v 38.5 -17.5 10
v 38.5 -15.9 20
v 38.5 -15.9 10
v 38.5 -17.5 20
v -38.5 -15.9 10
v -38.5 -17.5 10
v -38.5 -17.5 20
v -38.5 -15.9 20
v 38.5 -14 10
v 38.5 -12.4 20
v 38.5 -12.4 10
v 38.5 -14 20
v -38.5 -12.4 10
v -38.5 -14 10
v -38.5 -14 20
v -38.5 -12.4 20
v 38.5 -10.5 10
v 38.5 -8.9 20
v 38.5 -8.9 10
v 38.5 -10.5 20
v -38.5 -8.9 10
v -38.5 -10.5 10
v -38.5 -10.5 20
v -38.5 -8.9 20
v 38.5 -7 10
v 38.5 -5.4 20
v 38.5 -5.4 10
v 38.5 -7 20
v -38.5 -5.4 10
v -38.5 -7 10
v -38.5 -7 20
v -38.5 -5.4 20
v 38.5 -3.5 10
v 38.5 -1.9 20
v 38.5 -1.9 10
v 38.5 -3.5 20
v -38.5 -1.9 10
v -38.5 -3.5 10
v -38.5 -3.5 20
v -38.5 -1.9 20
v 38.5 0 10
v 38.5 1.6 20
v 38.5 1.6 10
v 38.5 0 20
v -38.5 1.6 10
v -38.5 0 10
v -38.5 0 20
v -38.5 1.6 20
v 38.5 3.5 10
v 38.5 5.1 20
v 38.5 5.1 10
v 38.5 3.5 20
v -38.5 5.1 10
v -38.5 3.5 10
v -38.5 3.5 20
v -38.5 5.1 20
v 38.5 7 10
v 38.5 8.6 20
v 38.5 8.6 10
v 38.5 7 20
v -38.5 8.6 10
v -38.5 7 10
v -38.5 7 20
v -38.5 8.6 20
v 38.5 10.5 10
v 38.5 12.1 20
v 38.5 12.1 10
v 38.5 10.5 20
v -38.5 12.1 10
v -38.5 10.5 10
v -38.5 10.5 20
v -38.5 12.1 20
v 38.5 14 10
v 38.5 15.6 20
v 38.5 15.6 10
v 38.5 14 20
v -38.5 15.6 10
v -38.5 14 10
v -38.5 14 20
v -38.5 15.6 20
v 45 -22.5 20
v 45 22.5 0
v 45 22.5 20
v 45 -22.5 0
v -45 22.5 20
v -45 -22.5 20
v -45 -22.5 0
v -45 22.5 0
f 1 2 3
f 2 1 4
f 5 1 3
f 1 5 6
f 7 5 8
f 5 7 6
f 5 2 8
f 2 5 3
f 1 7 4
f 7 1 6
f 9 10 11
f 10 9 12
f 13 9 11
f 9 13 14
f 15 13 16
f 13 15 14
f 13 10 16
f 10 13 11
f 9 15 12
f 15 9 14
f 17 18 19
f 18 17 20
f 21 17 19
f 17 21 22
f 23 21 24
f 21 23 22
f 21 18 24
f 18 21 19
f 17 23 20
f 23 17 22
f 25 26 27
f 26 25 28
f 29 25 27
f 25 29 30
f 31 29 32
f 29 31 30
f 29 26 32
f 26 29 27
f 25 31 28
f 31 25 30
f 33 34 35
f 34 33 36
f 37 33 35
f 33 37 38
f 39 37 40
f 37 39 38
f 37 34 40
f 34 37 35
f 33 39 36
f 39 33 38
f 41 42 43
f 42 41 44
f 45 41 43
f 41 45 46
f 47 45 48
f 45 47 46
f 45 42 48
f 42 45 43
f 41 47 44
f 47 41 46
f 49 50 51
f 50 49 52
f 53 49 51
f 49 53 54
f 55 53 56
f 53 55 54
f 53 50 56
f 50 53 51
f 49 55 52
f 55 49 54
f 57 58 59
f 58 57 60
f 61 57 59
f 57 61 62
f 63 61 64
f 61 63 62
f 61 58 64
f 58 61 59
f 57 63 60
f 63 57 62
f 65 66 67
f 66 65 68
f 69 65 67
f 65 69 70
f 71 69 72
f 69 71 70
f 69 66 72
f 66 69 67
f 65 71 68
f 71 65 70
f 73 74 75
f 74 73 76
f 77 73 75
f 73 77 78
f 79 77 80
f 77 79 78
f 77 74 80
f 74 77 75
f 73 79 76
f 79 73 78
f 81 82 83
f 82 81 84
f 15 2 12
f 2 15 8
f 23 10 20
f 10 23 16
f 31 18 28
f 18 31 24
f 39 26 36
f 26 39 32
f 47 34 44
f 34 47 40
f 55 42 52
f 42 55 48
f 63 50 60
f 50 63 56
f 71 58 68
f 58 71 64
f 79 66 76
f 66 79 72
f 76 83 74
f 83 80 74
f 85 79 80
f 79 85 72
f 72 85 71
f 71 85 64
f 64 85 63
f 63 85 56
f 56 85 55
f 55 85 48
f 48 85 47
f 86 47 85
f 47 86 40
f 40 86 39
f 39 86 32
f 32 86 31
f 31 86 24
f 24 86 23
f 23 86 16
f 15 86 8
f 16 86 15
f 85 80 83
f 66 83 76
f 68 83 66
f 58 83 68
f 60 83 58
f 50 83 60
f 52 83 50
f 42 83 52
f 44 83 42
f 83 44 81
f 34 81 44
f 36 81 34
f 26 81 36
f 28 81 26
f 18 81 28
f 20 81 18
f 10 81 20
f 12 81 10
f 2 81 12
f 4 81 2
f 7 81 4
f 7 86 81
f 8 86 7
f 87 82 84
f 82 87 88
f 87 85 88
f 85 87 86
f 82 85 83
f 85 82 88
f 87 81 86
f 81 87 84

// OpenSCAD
// Drying rack for 10 microscope slides, standing upright on their long edge
// Units: mm

// ---- Block ----
block_len   = 90;    // X length of base block
block_wid   = 45;    // Y width of base block
block_ht    = 20;    // Z height of base block

// ---- Slots ----
slot_count  = 10;    // number of parallel slots
slot_len    = 77;    // slot length along X
slot_w      = 1.6;   // slot width in Y
slot_depth  = 10;    // slot depth from top face (Z)
slot_pitch  = 3.5;   // centre-to-centre spacing in Y
overcut     = 0.5;   // extra length so cutters pass through the top face

// ---- Resolution ----
$fn = 64;

// ---- Derived ----
slot_group_w = slot_count * slot_pitch;                 // total width of slot group (35 mm)
block_y0     = -block_wid / 2;                          // block lower Y edge
slot_y0      = block_y0 + (block_wid - slot_group_w) / 2;   // first slot lower edge
z_top        = block_ht;                                // top face height

// ---- Model ----
difference() {
    // Solid base block, centred in X, resting on z = 0
    translate([-block_len / 2, block_y0, 0])
        cube([block_len, block_wid, block_ht]);

    // 10 parallel slots, open at the top
    for (i = [0 : slot_count - 1])
        translate([-slot_len / 2, slot_y0 + i * slot_pitch, z_top - slot_depth])
            cube([slot_len, slot_w, slot_depth + overcut]);
}
